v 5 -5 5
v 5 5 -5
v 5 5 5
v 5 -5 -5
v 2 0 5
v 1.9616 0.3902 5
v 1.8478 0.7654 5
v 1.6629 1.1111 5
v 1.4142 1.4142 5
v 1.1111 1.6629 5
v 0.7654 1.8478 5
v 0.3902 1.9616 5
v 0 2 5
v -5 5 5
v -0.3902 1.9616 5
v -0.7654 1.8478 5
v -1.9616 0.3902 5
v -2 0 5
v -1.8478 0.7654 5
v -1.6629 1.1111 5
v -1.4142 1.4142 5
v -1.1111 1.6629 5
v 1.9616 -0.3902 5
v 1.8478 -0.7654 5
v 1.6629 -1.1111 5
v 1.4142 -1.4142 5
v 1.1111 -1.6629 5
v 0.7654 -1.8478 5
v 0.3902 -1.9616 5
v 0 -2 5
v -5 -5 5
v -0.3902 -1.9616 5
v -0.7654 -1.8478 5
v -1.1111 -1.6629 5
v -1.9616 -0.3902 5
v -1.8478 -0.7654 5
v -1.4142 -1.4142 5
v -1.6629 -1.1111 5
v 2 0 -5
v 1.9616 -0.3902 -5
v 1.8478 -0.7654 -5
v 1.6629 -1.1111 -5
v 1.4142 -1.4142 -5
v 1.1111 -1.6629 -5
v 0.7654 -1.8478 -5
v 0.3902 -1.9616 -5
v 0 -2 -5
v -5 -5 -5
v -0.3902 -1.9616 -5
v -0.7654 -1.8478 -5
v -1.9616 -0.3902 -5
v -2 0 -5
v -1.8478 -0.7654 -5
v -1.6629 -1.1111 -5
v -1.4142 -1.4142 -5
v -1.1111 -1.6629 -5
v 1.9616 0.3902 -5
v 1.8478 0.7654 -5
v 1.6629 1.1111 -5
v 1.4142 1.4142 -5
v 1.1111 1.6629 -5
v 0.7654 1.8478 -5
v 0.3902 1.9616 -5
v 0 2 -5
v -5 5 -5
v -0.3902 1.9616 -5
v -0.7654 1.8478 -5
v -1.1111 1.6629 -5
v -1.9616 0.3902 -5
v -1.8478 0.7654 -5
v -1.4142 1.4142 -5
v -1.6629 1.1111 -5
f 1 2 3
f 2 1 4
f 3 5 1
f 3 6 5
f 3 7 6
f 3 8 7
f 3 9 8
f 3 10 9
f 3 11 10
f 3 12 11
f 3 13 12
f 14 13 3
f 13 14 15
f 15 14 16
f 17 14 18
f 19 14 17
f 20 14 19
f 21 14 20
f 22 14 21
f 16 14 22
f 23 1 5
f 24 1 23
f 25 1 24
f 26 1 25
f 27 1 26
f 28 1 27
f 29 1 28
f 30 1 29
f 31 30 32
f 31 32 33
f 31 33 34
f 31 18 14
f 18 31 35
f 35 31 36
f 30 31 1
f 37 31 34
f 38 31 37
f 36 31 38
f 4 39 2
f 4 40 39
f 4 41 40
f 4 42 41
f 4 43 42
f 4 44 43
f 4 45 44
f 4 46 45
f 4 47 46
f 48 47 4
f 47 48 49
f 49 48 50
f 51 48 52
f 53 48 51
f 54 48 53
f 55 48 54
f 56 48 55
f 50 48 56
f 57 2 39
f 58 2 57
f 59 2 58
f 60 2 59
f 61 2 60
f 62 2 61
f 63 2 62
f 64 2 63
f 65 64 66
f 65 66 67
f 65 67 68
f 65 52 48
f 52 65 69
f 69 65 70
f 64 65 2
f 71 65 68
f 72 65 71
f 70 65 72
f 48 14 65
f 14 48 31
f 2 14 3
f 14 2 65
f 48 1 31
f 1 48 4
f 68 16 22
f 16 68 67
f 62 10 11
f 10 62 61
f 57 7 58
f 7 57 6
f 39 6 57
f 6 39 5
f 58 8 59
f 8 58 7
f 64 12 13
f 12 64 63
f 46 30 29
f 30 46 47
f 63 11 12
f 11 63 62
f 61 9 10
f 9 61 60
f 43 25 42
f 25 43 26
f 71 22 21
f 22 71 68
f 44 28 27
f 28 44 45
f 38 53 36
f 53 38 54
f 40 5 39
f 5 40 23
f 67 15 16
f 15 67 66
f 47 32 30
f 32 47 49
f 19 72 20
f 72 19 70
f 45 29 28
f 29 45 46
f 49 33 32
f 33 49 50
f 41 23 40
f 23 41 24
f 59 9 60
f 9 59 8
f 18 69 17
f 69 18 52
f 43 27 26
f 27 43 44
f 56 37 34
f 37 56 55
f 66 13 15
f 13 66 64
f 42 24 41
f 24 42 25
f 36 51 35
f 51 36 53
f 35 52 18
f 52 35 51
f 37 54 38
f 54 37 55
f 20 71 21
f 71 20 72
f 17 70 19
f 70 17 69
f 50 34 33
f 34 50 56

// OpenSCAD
// Generated by scadwright. Do not hand-edit —
// edit the Python source and regenerate.

$fn = 32;

difference() {
    cube([10, 10, 10], center=true);
    cylinder(h=12, r=2, center=true);
}
